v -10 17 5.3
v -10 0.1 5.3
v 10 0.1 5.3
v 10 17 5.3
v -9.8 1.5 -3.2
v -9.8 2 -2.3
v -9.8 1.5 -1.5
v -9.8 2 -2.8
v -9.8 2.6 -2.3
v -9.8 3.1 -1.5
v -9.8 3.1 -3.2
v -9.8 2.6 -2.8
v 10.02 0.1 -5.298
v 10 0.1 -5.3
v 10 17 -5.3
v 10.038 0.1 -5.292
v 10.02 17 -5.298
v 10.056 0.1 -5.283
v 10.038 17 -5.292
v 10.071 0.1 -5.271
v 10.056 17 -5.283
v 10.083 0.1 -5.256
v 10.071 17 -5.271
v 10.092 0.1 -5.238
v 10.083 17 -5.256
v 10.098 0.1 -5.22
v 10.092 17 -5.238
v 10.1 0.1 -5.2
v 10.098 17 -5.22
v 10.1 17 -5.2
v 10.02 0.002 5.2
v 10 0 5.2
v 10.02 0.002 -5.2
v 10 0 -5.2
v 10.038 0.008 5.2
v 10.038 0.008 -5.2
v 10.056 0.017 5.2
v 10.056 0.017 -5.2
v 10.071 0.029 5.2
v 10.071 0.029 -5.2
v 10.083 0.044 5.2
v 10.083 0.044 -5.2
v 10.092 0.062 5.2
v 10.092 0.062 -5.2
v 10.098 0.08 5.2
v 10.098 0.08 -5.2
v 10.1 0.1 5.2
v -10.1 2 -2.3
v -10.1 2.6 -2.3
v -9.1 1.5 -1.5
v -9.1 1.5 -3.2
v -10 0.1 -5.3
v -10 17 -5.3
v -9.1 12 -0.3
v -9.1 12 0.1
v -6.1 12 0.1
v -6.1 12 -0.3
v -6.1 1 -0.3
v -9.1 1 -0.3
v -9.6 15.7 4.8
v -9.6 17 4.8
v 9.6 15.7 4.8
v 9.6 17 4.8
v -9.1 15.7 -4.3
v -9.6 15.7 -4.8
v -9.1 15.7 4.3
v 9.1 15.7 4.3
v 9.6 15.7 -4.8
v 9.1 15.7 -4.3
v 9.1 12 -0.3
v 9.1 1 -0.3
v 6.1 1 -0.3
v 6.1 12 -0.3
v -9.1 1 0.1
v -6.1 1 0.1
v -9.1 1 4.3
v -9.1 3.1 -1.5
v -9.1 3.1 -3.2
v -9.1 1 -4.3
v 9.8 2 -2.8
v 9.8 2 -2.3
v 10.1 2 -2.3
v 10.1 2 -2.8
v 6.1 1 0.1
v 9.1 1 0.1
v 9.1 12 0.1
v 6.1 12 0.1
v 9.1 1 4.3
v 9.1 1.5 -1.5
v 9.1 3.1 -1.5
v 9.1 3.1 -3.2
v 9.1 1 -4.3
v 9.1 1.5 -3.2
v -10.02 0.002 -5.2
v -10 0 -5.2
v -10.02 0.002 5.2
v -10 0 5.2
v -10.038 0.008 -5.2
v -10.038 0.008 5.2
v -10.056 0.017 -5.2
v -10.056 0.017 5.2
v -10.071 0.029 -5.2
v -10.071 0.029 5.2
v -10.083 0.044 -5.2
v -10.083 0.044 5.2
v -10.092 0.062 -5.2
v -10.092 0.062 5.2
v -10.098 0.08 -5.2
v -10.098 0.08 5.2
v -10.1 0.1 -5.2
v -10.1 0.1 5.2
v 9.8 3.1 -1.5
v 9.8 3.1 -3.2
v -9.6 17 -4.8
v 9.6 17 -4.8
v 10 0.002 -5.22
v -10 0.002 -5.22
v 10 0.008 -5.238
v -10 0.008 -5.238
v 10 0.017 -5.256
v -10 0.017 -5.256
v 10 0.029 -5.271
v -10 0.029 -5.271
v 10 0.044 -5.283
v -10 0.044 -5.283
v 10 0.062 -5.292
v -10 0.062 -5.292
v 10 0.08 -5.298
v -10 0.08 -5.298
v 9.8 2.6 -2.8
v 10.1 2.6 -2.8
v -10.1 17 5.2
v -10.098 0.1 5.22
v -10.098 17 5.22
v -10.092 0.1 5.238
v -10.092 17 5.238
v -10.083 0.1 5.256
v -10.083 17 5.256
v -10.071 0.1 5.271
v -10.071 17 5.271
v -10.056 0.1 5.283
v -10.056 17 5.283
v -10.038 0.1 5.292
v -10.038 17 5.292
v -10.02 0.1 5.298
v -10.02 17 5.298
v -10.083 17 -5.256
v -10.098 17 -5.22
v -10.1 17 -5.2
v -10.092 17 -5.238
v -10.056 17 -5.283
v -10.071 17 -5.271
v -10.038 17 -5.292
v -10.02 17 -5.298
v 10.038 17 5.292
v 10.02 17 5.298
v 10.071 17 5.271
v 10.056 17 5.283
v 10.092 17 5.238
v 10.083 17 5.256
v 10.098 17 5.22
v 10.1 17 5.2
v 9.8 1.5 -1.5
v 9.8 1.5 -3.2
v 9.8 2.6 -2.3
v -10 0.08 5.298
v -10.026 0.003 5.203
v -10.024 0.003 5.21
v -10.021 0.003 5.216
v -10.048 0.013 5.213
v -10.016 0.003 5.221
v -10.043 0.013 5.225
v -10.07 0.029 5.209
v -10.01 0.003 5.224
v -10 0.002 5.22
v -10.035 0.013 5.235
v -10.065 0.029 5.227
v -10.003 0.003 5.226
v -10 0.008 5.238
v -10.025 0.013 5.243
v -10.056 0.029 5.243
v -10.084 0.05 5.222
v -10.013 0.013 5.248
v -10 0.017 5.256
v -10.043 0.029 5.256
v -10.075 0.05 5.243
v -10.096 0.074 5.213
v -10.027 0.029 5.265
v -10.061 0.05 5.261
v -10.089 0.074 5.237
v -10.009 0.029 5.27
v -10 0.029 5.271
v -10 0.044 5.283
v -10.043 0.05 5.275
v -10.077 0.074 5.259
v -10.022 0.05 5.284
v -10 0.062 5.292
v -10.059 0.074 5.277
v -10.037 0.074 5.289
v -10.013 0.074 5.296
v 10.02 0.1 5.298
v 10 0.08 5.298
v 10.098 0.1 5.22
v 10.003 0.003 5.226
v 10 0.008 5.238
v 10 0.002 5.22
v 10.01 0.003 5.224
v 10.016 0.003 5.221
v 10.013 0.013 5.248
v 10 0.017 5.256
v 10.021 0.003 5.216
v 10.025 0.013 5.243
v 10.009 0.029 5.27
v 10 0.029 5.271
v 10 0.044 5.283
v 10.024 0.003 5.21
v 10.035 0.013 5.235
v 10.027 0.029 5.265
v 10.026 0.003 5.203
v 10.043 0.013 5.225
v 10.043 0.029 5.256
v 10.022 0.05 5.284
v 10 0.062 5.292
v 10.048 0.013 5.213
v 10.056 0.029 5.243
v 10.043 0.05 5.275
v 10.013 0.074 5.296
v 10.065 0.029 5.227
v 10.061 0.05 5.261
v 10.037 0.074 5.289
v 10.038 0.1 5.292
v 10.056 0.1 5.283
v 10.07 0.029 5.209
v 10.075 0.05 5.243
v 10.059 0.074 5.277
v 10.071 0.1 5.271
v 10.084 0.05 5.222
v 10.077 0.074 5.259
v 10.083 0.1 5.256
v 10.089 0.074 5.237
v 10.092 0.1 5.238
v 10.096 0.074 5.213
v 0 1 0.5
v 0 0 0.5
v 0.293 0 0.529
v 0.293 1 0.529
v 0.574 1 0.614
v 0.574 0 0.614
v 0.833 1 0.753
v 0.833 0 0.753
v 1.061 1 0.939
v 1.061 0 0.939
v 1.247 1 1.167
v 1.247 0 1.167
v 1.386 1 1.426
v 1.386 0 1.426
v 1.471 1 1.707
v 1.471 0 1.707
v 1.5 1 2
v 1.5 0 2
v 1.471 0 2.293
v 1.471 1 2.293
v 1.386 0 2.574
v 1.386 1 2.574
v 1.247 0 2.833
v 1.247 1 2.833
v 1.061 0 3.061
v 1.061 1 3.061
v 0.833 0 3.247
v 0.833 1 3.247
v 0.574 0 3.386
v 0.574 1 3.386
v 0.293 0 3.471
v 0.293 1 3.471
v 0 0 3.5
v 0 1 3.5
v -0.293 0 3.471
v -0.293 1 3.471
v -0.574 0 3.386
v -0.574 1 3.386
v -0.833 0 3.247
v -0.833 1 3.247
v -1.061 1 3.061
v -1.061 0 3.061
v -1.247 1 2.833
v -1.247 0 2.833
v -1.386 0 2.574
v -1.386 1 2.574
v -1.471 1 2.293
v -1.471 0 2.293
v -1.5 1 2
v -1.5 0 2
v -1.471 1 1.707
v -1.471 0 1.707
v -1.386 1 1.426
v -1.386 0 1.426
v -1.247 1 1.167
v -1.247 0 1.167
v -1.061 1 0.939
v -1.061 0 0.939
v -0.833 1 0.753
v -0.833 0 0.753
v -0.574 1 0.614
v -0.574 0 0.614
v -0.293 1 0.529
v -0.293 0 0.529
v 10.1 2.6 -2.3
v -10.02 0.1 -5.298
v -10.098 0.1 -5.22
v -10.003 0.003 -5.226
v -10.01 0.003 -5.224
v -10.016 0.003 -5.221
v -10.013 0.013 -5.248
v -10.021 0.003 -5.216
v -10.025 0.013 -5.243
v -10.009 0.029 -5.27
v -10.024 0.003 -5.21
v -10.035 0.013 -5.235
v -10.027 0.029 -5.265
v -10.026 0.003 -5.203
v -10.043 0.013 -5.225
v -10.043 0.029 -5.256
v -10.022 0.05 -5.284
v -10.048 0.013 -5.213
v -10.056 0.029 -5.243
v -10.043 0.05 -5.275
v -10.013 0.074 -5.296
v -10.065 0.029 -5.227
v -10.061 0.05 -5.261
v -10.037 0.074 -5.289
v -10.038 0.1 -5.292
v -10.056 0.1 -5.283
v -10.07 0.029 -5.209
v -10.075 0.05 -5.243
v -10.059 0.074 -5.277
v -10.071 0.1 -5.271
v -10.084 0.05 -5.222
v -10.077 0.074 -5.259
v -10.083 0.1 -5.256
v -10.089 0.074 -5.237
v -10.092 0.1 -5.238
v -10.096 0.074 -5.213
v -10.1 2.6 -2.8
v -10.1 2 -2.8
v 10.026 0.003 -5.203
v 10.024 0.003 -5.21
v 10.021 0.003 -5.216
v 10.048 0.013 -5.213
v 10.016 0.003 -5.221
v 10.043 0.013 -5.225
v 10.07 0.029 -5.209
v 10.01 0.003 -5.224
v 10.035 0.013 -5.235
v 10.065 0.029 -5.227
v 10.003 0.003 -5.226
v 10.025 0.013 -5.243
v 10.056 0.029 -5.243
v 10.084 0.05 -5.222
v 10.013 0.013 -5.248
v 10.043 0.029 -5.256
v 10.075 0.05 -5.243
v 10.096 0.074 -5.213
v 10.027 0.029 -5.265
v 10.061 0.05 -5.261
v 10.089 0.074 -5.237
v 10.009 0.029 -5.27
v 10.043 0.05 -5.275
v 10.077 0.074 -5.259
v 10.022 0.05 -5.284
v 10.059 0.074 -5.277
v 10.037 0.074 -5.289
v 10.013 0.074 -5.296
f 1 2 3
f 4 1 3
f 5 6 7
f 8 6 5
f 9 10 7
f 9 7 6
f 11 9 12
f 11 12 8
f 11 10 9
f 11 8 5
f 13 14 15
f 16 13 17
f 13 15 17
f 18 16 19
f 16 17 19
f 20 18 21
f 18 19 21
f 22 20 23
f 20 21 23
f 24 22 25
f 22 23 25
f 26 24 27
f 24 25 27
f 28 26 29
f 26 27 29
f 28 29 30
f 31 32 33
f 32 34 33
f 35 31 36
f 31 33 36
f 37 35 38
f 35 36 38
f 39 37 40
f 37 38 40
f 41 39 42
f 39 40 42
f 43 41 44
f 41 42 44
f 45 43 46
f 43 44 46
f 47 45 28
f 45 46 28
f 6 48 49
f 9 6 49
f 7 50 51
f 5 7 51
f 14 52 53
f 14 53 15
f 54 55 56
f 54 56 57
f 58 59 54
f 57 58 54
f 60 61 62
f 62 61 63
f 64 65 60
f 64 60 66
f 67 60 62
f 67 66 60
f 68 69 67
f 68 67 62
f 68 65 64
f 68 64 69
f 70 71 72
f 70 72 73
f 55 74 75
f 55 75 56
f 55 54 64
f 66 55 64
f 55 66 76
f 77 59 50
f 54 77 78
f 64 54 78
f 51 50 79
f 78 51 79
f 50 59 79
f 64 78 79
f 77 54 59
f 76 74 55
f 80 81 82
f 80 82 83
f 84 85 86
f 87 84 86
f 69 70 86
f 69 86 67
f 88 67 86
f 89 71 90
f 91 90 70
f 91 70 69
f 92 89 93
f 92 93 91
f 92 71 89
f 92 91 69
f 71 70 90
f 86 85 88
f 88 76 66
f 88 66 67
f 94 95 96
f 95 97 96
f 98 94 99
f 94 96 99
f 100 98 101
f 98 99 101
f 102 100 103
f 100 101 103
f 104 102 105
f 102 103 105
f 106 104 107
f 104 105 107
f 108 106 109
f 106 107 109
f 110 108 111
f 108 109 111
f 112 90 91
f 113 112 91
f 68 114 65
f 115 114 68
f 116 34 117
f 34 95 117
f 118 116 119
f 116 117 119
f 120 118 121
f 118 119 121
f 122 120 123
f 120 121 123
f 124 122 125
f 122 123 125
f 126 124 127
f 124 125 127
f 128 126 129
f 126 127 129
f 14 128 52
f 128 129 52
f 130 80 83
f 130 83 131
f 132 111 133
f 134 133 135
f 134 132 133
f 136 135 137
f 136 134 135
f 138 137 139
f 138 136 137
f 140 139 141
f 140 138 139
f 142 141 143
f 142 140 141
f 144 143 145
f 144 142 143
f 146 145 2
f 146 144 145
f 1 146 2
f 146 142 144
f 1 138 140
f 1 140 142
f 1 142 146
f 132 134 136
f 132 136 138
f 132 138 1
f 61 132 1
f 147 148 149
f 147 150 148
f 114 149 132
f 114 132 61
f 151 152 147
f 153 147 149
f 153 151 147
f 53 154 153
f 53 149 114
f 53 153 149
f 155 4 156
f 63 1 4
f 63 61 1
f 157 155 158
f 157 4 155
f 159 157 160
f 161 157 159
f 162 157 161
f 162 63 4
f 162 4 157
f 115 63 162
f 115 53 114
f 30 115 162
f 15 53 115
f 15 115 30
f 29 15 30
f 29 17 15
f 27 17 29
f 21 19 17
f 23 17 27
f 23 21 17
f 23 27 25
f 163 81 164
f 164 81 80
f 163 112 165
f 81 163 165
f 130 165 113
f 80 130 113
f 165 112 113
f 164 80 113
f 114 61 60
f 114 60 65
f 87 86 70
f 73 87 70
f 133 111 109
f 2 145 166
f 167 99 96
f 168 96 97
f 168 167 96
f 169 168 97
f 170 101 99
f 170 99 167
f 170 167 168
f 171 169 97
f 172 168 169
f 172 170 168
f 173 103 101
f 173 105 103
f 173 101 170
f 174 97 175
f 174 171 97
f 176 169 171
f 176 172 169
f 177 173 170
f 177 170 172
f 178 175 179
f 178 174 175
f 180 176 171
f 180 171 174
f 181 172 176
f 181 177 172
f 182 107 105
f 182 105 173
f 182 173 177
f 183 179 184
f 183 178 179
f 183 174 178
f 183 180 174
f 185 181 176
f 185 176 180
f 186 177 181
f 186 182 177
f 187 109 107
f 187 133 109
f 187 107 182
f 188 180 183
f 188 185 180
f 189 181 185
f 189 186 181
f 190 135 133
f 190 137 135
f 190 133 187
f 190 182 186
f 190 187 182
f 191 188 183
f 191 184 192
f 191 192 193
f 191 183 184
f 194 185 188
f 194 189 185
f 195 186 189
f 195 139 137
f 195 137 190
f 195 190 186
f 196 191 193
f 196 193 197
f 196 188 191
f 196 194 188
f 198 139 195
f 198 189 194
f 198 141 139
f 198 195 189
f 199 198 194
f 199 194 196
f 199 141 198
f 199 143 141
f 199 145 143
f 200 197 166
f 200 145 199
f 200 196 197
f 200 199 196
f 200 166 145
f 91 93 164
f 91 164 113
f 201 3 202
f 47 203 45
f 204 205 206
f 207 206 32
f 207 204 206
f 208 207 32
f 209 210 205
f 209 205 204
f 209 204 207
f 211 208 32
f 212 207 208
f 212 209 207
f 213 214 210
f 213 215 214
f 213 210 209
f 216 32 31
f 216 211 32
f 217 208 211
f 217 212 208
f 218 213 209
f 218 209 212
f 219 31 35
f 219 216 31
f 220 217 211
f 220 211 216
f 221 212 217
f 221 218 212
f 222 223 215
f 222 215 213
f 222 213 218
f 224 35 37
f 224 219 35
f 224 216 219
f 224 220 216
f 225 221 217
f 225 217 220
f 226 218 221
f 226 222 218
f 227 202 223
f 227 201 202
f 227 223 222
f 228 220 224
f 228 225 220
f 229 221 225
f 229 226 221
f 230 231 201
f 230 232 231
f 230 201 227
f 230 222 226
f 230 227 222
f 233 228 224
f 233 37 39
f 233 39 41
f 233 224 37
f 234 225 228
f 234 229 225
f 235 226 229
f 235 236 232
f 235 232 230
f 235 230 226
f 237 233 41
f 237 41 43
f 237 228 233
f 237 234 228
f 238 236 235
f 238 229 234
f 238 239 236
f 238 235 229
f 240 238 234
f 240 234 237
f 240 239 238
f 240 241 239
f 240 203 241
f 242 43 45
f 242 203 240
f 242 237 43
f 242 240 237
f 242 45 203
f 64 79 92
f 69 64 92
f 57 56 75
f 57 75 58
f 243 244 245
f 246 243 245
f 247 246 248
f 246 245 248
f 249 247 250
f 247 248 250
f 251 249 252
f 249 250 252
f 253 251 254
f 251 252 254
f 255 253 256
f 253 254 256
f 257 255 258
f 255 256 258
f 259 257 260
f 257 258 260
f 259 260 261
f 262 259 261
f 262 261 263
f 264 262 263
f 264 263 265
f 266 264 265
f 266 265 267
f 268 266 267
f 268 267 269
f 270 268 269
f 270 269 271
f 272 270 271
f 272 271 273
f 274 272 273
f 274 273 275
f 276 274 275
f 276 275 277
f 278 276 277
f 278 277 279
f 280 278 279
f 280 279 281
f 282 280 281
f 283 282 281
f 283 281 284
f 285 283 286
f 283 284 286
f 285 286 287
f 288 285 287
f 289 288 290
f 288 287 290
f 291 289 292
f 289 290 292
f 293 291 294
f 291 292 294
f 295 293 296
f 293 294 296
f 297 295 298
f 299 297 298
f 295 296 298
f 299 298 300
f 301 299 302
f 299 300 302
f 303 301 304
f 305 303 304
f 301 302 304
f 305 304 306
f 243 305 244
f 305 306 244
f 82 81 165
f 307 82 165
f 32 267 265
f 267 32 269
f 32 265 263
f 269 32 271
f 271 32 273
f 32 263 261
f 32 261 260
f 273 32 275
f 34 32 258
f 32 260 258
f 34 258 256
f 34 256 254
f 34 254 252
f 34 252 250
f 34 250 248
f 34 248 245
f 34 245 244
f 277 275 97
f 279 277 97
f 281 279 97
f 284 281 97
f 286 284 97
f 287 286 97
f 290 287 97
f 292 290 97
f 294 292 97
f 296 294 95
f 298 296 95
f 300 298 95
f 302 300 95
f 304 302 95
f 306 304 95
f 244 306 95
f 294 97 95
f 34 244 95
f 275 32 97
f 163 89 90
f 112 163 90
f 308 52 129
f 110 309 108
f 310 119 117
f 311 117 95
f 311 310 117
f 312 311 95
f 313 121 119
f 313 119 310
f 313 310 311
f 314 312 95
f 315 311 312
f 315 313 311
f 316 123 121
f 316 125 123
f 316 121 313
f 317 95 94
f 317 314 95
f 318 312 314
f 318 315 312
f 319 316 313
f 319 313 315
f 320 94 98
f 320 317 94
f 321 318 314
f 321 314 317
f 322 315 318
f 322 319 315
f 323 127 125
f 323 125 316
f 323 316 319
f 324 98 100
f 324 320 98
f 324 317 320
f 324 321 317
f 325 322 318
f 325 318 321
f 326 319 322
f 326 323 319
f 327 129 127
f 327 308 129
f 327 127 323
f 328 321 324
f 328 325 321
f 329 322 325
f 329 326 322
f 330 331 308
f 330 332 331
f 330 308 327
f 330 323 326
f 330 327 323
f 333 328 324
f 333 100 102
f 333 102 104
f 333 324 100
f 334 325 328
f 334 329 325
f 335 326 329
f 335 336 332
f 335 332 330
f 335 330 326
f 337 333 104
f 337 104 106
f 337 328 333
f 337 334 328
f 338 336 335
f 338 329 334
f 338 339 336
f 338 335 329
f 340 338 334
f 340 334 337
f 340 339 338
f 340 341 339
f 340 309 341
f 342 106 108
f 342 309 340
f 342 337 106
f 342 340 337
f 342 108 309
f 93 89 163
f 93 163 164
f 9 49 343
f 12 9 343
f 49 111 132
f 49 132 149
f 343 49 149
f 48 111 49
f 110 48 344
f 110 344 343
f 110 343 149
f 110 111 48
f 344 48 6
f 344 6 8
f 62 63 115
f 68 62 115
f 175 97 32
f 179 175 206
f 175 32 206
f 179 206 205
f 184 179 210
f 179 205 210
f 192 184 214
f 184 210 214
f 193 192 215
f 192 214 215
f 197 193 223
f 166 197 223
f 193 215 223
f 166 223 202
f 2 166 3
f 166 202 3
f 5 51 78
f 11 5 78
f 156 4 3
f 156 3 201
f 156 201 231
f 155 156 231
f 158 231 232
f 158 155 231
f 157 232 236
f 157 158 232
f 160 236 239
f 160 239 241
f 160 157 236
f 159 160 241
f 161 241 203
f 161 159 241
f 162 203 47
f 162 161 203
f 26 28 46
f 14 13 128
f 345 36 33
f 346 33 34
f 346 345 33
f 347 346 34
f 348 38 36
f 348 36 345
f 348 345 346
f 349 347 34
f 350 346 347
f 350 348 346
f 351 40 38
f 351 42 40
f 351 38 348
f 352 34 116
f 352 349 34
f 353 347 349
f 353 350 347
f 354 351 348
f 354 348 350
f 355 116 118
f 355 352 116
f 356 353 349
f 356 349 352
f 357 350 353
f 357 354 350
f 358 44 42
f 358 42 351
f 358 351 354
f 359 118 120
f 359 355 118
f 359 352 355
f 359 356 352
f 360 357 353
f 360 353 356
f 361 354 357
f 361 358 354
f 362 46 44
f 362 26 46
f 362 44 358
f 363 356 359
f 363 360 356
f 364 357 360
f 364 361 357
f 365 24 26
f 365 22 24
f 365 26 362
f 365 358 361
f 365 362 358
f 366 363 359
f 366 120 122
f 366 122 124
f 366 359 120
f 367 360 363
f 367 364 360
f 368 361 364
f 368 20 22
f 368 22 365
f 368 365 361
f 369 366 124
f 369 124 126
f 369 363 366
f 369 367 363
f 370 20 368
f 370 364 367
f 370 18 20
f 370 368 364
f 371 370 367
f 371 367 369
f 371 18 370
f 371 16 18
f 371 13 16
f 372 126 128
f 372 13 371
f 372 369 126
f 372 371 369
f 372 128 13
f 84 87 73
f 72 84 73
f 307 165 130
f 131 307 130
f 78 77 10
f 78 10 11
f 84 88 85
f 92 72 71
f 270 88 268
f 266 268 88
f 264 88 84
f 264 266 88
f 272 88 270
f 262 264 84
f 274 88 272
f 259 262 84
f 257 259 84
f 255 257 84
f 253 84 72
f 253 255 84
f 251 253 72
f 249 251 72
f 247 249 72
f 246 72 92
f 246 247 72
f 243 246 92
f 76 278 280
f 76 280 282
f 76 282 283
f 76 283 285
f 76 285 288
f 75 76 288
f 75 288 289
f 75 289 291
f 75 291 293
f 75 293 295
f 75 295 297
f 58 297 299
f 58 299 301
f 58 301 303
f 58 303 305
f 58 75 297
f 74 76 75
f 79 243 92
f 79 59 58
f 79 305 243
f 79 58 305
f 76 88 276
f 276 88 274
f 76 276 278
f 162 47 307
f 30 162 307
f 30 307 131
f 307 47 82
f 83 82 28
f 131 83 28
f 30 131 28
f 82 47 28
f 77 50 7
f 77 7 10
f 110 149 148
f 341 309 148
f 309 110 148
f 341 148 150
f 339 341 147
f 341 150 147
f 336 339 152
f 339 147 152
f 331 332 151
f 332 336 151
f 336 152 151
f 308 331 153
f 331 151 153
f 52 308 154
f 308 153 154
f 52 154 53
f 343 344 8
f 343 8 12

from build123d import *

# Parameters (mm, degrees)
SKETCH1_2_W             = 20.2
SKETCH1_2_H             = 10.6
SKETCH1_2_W_2           = 18.2
SKETCH1_2_H_2           = 8.6
BOSS_EXTRUDE1_DEPTH     = 17
SKETCH3_W               = 8.6
SKETCH3_H               = 1
BOSS_EXTRUDE2_DEPTH     = 19.2
SKETCH4_W               = 19.2
SKETCH4_H               = 9.6
CUT_EXTRUDE1_DEPTH      = 1.3
CUT_EXTRUDE2_REACH      = 22.472
SKETCH6_R               = 1.5
SKETCH8_W               = 0.4
SKETCH8_H               = 11
BOSS_EXTRUDE3_DEPTH     = 3
CUT_EXTRUDE3_DEPTH      = 27.186446876
CUT_EXTRUDE3_DEPTH_BACK = 27.186446876
SKETCH11_W              = 0.5
SKETCH11_H              = 0.6
FILLET12_R              = 0.1
FILLET13_R              = 0.1
SKETCH13_W              = 1.7
SKETCH13_H              = 1.6
CUT_EXTRUDE4_DEPTH      = 0.7


with BuildPart() as part:
    # Sketch1<2> → Boss-Extrude1 (new body)
    with BuildSketch(Plane(origin=(0, 0, 0), x_dir=(1, 0, 0), z_dir=(0, 1, 0))):
        Rectangle(SKETCH1_2_W, SKETCH1_2_H)
        Rectangle(SKETCH1_2_W_2, SKETCH1_2_H_2, mode=Mode.SUBTRACT)
    extrude(amount=BOSS_EXTRUDE1_DEPTH)

    # Sketch3 → Boss-Extrude2 (add)
    with BuildSketch(Plane(origin=(-9.1, 0, 0), x_dir=(0, 0, -1), z_dir=(1, 0, 0))):
        with Locations((0, 0.5)):
            Rectangle(SKETCH3_W, SKETCH3_H)
    extrude(amount=BOSS_EXTRUDE2_DEPTH)

    # Sketch4 → Cut-Extrude1 (cut)
    with BuildSketch(Plane(origin=(0, 17, 0), x_dir=(1, 0, 0), z_dir=(0, 1, 0))):
        Rectangle(SKETCH4_W, SKETCH4_H)
    extrude(amount=-CUT_EXTRUDE1_DEPTH, mode=Mode.SUBTRACT)

    # Sketch6 → Cut-Extrude2 (cut, up to next)
    with BuildSketch(Plane.XZ, mode=Mode.PRIVATE) as cut_extrude2_sk1:
        with Locations(Location((0, 2, 0), (0, 0, 270))):
            Circle(SKETCH6_R)
    cut_extrude2_tool1 = extrude(cut_extrude2_sk1.sketch, amount=-CUT_EXTRUDE2_REACH, mode=Mode.PRIVATE) & part.part
    add(cut_extrude2_tool1.solids().sort_by_distance((0, 0, 2))[0], mode=Mode.SUBTRACT)

    # Sketch8 → Boss-Extrude3 (add)
    with BuildSketch(Plane(origin=(-9.1, 0, 0), x_dir=(0, 0, -1), z_dir=(1, 0, 0))):
        with Locations((0.1, 6.5)):
            Rectangle(SKETCH8_W, SKETCH8_H)
    boss_extrude3 = extrude(amount=BOSS_EXTRUDE3_DEPTH)

    # Mirror1: Boss-Extrude3 across plane
    add(boss_extrude3.mirror(Plane(origin=(0, 0, 0), x_dir=(0, 0, 1), z_dir=(1, 0, 0))))

    # Sketch11 → Cut-Extrude3 (cut, two sides: drawn at the far end of the back side and taken through both)
    with BuildSketch(Plane(origin=(-9.1, 0, 0), x_dir=(0, 0, -1), z_dir=(1, 0, 0)).offset(-CUT_EXTRUDE3_DEPTH_BACK)):
        with Locations((2.55, 2.3)):
            Rectangle(SKETCH11_W, SKETCH11_H)
    extrude(amount=CUT_EXTRUDE3_DEPTH + CUT_EXTRUDE3_DEPTH_BACK, mode=Mode.SUBTRACT)

    # Fillet12
    fillet12_edges = [part.edges().sort_by_distance(p)[0] for p in [
        (10.1, 8.5, 5.3),
        (-10.1, 8.5, 5.3),
        (-10.1, 8.5, -5.3),
        (10.1, 8.5, -5.3),
    ]]
    fillet(fillet12_edges, radius=FILLET12_R)

    # Fillet13
    fillet13_edges = [part.edges().sort_by_distance(p)[0] for p in [
        (0, 0, 5.3),
        (0, 0, -5.3),
        (10.1, 0, 0),
        (-10.1, 0, 0),
        (-10.070710678, 0, -5.270710678),
        (10.070710678, 0, -5.270710678),
        (10.070710678, 0, 5.270710678),
        (-10.070710678, 0, 5.270710678),
    ]]
    fillet(fillet13_edges, radius=FILLET13_R)

    # Sketch13 → Cut-Extrude4 (cut)
    with BuildSketch(Plane(origin=(-9.1, 0, 0), x_dir=(0, 0, -1), z_dir=(1, 0, 0))):
        with Locations((2.35, 2.3)):
            Rectangle(SKETCH13_W, SKETCH13_H)
    cut_extrude4 = extrude(amount=-CUT_EXTRUDE4_DEPTH, mode=Mode.SUBTRACT)

    # Mirror2: Cut-Extrude4 across plane
    add(cut_extrude4.mirror(Plane(origin=(0, 0, 0), x_dir=(0, 0, 1), z_dir=(1, 0, 0))), mode=Mode.SUBTRACT)


solid = part.part
